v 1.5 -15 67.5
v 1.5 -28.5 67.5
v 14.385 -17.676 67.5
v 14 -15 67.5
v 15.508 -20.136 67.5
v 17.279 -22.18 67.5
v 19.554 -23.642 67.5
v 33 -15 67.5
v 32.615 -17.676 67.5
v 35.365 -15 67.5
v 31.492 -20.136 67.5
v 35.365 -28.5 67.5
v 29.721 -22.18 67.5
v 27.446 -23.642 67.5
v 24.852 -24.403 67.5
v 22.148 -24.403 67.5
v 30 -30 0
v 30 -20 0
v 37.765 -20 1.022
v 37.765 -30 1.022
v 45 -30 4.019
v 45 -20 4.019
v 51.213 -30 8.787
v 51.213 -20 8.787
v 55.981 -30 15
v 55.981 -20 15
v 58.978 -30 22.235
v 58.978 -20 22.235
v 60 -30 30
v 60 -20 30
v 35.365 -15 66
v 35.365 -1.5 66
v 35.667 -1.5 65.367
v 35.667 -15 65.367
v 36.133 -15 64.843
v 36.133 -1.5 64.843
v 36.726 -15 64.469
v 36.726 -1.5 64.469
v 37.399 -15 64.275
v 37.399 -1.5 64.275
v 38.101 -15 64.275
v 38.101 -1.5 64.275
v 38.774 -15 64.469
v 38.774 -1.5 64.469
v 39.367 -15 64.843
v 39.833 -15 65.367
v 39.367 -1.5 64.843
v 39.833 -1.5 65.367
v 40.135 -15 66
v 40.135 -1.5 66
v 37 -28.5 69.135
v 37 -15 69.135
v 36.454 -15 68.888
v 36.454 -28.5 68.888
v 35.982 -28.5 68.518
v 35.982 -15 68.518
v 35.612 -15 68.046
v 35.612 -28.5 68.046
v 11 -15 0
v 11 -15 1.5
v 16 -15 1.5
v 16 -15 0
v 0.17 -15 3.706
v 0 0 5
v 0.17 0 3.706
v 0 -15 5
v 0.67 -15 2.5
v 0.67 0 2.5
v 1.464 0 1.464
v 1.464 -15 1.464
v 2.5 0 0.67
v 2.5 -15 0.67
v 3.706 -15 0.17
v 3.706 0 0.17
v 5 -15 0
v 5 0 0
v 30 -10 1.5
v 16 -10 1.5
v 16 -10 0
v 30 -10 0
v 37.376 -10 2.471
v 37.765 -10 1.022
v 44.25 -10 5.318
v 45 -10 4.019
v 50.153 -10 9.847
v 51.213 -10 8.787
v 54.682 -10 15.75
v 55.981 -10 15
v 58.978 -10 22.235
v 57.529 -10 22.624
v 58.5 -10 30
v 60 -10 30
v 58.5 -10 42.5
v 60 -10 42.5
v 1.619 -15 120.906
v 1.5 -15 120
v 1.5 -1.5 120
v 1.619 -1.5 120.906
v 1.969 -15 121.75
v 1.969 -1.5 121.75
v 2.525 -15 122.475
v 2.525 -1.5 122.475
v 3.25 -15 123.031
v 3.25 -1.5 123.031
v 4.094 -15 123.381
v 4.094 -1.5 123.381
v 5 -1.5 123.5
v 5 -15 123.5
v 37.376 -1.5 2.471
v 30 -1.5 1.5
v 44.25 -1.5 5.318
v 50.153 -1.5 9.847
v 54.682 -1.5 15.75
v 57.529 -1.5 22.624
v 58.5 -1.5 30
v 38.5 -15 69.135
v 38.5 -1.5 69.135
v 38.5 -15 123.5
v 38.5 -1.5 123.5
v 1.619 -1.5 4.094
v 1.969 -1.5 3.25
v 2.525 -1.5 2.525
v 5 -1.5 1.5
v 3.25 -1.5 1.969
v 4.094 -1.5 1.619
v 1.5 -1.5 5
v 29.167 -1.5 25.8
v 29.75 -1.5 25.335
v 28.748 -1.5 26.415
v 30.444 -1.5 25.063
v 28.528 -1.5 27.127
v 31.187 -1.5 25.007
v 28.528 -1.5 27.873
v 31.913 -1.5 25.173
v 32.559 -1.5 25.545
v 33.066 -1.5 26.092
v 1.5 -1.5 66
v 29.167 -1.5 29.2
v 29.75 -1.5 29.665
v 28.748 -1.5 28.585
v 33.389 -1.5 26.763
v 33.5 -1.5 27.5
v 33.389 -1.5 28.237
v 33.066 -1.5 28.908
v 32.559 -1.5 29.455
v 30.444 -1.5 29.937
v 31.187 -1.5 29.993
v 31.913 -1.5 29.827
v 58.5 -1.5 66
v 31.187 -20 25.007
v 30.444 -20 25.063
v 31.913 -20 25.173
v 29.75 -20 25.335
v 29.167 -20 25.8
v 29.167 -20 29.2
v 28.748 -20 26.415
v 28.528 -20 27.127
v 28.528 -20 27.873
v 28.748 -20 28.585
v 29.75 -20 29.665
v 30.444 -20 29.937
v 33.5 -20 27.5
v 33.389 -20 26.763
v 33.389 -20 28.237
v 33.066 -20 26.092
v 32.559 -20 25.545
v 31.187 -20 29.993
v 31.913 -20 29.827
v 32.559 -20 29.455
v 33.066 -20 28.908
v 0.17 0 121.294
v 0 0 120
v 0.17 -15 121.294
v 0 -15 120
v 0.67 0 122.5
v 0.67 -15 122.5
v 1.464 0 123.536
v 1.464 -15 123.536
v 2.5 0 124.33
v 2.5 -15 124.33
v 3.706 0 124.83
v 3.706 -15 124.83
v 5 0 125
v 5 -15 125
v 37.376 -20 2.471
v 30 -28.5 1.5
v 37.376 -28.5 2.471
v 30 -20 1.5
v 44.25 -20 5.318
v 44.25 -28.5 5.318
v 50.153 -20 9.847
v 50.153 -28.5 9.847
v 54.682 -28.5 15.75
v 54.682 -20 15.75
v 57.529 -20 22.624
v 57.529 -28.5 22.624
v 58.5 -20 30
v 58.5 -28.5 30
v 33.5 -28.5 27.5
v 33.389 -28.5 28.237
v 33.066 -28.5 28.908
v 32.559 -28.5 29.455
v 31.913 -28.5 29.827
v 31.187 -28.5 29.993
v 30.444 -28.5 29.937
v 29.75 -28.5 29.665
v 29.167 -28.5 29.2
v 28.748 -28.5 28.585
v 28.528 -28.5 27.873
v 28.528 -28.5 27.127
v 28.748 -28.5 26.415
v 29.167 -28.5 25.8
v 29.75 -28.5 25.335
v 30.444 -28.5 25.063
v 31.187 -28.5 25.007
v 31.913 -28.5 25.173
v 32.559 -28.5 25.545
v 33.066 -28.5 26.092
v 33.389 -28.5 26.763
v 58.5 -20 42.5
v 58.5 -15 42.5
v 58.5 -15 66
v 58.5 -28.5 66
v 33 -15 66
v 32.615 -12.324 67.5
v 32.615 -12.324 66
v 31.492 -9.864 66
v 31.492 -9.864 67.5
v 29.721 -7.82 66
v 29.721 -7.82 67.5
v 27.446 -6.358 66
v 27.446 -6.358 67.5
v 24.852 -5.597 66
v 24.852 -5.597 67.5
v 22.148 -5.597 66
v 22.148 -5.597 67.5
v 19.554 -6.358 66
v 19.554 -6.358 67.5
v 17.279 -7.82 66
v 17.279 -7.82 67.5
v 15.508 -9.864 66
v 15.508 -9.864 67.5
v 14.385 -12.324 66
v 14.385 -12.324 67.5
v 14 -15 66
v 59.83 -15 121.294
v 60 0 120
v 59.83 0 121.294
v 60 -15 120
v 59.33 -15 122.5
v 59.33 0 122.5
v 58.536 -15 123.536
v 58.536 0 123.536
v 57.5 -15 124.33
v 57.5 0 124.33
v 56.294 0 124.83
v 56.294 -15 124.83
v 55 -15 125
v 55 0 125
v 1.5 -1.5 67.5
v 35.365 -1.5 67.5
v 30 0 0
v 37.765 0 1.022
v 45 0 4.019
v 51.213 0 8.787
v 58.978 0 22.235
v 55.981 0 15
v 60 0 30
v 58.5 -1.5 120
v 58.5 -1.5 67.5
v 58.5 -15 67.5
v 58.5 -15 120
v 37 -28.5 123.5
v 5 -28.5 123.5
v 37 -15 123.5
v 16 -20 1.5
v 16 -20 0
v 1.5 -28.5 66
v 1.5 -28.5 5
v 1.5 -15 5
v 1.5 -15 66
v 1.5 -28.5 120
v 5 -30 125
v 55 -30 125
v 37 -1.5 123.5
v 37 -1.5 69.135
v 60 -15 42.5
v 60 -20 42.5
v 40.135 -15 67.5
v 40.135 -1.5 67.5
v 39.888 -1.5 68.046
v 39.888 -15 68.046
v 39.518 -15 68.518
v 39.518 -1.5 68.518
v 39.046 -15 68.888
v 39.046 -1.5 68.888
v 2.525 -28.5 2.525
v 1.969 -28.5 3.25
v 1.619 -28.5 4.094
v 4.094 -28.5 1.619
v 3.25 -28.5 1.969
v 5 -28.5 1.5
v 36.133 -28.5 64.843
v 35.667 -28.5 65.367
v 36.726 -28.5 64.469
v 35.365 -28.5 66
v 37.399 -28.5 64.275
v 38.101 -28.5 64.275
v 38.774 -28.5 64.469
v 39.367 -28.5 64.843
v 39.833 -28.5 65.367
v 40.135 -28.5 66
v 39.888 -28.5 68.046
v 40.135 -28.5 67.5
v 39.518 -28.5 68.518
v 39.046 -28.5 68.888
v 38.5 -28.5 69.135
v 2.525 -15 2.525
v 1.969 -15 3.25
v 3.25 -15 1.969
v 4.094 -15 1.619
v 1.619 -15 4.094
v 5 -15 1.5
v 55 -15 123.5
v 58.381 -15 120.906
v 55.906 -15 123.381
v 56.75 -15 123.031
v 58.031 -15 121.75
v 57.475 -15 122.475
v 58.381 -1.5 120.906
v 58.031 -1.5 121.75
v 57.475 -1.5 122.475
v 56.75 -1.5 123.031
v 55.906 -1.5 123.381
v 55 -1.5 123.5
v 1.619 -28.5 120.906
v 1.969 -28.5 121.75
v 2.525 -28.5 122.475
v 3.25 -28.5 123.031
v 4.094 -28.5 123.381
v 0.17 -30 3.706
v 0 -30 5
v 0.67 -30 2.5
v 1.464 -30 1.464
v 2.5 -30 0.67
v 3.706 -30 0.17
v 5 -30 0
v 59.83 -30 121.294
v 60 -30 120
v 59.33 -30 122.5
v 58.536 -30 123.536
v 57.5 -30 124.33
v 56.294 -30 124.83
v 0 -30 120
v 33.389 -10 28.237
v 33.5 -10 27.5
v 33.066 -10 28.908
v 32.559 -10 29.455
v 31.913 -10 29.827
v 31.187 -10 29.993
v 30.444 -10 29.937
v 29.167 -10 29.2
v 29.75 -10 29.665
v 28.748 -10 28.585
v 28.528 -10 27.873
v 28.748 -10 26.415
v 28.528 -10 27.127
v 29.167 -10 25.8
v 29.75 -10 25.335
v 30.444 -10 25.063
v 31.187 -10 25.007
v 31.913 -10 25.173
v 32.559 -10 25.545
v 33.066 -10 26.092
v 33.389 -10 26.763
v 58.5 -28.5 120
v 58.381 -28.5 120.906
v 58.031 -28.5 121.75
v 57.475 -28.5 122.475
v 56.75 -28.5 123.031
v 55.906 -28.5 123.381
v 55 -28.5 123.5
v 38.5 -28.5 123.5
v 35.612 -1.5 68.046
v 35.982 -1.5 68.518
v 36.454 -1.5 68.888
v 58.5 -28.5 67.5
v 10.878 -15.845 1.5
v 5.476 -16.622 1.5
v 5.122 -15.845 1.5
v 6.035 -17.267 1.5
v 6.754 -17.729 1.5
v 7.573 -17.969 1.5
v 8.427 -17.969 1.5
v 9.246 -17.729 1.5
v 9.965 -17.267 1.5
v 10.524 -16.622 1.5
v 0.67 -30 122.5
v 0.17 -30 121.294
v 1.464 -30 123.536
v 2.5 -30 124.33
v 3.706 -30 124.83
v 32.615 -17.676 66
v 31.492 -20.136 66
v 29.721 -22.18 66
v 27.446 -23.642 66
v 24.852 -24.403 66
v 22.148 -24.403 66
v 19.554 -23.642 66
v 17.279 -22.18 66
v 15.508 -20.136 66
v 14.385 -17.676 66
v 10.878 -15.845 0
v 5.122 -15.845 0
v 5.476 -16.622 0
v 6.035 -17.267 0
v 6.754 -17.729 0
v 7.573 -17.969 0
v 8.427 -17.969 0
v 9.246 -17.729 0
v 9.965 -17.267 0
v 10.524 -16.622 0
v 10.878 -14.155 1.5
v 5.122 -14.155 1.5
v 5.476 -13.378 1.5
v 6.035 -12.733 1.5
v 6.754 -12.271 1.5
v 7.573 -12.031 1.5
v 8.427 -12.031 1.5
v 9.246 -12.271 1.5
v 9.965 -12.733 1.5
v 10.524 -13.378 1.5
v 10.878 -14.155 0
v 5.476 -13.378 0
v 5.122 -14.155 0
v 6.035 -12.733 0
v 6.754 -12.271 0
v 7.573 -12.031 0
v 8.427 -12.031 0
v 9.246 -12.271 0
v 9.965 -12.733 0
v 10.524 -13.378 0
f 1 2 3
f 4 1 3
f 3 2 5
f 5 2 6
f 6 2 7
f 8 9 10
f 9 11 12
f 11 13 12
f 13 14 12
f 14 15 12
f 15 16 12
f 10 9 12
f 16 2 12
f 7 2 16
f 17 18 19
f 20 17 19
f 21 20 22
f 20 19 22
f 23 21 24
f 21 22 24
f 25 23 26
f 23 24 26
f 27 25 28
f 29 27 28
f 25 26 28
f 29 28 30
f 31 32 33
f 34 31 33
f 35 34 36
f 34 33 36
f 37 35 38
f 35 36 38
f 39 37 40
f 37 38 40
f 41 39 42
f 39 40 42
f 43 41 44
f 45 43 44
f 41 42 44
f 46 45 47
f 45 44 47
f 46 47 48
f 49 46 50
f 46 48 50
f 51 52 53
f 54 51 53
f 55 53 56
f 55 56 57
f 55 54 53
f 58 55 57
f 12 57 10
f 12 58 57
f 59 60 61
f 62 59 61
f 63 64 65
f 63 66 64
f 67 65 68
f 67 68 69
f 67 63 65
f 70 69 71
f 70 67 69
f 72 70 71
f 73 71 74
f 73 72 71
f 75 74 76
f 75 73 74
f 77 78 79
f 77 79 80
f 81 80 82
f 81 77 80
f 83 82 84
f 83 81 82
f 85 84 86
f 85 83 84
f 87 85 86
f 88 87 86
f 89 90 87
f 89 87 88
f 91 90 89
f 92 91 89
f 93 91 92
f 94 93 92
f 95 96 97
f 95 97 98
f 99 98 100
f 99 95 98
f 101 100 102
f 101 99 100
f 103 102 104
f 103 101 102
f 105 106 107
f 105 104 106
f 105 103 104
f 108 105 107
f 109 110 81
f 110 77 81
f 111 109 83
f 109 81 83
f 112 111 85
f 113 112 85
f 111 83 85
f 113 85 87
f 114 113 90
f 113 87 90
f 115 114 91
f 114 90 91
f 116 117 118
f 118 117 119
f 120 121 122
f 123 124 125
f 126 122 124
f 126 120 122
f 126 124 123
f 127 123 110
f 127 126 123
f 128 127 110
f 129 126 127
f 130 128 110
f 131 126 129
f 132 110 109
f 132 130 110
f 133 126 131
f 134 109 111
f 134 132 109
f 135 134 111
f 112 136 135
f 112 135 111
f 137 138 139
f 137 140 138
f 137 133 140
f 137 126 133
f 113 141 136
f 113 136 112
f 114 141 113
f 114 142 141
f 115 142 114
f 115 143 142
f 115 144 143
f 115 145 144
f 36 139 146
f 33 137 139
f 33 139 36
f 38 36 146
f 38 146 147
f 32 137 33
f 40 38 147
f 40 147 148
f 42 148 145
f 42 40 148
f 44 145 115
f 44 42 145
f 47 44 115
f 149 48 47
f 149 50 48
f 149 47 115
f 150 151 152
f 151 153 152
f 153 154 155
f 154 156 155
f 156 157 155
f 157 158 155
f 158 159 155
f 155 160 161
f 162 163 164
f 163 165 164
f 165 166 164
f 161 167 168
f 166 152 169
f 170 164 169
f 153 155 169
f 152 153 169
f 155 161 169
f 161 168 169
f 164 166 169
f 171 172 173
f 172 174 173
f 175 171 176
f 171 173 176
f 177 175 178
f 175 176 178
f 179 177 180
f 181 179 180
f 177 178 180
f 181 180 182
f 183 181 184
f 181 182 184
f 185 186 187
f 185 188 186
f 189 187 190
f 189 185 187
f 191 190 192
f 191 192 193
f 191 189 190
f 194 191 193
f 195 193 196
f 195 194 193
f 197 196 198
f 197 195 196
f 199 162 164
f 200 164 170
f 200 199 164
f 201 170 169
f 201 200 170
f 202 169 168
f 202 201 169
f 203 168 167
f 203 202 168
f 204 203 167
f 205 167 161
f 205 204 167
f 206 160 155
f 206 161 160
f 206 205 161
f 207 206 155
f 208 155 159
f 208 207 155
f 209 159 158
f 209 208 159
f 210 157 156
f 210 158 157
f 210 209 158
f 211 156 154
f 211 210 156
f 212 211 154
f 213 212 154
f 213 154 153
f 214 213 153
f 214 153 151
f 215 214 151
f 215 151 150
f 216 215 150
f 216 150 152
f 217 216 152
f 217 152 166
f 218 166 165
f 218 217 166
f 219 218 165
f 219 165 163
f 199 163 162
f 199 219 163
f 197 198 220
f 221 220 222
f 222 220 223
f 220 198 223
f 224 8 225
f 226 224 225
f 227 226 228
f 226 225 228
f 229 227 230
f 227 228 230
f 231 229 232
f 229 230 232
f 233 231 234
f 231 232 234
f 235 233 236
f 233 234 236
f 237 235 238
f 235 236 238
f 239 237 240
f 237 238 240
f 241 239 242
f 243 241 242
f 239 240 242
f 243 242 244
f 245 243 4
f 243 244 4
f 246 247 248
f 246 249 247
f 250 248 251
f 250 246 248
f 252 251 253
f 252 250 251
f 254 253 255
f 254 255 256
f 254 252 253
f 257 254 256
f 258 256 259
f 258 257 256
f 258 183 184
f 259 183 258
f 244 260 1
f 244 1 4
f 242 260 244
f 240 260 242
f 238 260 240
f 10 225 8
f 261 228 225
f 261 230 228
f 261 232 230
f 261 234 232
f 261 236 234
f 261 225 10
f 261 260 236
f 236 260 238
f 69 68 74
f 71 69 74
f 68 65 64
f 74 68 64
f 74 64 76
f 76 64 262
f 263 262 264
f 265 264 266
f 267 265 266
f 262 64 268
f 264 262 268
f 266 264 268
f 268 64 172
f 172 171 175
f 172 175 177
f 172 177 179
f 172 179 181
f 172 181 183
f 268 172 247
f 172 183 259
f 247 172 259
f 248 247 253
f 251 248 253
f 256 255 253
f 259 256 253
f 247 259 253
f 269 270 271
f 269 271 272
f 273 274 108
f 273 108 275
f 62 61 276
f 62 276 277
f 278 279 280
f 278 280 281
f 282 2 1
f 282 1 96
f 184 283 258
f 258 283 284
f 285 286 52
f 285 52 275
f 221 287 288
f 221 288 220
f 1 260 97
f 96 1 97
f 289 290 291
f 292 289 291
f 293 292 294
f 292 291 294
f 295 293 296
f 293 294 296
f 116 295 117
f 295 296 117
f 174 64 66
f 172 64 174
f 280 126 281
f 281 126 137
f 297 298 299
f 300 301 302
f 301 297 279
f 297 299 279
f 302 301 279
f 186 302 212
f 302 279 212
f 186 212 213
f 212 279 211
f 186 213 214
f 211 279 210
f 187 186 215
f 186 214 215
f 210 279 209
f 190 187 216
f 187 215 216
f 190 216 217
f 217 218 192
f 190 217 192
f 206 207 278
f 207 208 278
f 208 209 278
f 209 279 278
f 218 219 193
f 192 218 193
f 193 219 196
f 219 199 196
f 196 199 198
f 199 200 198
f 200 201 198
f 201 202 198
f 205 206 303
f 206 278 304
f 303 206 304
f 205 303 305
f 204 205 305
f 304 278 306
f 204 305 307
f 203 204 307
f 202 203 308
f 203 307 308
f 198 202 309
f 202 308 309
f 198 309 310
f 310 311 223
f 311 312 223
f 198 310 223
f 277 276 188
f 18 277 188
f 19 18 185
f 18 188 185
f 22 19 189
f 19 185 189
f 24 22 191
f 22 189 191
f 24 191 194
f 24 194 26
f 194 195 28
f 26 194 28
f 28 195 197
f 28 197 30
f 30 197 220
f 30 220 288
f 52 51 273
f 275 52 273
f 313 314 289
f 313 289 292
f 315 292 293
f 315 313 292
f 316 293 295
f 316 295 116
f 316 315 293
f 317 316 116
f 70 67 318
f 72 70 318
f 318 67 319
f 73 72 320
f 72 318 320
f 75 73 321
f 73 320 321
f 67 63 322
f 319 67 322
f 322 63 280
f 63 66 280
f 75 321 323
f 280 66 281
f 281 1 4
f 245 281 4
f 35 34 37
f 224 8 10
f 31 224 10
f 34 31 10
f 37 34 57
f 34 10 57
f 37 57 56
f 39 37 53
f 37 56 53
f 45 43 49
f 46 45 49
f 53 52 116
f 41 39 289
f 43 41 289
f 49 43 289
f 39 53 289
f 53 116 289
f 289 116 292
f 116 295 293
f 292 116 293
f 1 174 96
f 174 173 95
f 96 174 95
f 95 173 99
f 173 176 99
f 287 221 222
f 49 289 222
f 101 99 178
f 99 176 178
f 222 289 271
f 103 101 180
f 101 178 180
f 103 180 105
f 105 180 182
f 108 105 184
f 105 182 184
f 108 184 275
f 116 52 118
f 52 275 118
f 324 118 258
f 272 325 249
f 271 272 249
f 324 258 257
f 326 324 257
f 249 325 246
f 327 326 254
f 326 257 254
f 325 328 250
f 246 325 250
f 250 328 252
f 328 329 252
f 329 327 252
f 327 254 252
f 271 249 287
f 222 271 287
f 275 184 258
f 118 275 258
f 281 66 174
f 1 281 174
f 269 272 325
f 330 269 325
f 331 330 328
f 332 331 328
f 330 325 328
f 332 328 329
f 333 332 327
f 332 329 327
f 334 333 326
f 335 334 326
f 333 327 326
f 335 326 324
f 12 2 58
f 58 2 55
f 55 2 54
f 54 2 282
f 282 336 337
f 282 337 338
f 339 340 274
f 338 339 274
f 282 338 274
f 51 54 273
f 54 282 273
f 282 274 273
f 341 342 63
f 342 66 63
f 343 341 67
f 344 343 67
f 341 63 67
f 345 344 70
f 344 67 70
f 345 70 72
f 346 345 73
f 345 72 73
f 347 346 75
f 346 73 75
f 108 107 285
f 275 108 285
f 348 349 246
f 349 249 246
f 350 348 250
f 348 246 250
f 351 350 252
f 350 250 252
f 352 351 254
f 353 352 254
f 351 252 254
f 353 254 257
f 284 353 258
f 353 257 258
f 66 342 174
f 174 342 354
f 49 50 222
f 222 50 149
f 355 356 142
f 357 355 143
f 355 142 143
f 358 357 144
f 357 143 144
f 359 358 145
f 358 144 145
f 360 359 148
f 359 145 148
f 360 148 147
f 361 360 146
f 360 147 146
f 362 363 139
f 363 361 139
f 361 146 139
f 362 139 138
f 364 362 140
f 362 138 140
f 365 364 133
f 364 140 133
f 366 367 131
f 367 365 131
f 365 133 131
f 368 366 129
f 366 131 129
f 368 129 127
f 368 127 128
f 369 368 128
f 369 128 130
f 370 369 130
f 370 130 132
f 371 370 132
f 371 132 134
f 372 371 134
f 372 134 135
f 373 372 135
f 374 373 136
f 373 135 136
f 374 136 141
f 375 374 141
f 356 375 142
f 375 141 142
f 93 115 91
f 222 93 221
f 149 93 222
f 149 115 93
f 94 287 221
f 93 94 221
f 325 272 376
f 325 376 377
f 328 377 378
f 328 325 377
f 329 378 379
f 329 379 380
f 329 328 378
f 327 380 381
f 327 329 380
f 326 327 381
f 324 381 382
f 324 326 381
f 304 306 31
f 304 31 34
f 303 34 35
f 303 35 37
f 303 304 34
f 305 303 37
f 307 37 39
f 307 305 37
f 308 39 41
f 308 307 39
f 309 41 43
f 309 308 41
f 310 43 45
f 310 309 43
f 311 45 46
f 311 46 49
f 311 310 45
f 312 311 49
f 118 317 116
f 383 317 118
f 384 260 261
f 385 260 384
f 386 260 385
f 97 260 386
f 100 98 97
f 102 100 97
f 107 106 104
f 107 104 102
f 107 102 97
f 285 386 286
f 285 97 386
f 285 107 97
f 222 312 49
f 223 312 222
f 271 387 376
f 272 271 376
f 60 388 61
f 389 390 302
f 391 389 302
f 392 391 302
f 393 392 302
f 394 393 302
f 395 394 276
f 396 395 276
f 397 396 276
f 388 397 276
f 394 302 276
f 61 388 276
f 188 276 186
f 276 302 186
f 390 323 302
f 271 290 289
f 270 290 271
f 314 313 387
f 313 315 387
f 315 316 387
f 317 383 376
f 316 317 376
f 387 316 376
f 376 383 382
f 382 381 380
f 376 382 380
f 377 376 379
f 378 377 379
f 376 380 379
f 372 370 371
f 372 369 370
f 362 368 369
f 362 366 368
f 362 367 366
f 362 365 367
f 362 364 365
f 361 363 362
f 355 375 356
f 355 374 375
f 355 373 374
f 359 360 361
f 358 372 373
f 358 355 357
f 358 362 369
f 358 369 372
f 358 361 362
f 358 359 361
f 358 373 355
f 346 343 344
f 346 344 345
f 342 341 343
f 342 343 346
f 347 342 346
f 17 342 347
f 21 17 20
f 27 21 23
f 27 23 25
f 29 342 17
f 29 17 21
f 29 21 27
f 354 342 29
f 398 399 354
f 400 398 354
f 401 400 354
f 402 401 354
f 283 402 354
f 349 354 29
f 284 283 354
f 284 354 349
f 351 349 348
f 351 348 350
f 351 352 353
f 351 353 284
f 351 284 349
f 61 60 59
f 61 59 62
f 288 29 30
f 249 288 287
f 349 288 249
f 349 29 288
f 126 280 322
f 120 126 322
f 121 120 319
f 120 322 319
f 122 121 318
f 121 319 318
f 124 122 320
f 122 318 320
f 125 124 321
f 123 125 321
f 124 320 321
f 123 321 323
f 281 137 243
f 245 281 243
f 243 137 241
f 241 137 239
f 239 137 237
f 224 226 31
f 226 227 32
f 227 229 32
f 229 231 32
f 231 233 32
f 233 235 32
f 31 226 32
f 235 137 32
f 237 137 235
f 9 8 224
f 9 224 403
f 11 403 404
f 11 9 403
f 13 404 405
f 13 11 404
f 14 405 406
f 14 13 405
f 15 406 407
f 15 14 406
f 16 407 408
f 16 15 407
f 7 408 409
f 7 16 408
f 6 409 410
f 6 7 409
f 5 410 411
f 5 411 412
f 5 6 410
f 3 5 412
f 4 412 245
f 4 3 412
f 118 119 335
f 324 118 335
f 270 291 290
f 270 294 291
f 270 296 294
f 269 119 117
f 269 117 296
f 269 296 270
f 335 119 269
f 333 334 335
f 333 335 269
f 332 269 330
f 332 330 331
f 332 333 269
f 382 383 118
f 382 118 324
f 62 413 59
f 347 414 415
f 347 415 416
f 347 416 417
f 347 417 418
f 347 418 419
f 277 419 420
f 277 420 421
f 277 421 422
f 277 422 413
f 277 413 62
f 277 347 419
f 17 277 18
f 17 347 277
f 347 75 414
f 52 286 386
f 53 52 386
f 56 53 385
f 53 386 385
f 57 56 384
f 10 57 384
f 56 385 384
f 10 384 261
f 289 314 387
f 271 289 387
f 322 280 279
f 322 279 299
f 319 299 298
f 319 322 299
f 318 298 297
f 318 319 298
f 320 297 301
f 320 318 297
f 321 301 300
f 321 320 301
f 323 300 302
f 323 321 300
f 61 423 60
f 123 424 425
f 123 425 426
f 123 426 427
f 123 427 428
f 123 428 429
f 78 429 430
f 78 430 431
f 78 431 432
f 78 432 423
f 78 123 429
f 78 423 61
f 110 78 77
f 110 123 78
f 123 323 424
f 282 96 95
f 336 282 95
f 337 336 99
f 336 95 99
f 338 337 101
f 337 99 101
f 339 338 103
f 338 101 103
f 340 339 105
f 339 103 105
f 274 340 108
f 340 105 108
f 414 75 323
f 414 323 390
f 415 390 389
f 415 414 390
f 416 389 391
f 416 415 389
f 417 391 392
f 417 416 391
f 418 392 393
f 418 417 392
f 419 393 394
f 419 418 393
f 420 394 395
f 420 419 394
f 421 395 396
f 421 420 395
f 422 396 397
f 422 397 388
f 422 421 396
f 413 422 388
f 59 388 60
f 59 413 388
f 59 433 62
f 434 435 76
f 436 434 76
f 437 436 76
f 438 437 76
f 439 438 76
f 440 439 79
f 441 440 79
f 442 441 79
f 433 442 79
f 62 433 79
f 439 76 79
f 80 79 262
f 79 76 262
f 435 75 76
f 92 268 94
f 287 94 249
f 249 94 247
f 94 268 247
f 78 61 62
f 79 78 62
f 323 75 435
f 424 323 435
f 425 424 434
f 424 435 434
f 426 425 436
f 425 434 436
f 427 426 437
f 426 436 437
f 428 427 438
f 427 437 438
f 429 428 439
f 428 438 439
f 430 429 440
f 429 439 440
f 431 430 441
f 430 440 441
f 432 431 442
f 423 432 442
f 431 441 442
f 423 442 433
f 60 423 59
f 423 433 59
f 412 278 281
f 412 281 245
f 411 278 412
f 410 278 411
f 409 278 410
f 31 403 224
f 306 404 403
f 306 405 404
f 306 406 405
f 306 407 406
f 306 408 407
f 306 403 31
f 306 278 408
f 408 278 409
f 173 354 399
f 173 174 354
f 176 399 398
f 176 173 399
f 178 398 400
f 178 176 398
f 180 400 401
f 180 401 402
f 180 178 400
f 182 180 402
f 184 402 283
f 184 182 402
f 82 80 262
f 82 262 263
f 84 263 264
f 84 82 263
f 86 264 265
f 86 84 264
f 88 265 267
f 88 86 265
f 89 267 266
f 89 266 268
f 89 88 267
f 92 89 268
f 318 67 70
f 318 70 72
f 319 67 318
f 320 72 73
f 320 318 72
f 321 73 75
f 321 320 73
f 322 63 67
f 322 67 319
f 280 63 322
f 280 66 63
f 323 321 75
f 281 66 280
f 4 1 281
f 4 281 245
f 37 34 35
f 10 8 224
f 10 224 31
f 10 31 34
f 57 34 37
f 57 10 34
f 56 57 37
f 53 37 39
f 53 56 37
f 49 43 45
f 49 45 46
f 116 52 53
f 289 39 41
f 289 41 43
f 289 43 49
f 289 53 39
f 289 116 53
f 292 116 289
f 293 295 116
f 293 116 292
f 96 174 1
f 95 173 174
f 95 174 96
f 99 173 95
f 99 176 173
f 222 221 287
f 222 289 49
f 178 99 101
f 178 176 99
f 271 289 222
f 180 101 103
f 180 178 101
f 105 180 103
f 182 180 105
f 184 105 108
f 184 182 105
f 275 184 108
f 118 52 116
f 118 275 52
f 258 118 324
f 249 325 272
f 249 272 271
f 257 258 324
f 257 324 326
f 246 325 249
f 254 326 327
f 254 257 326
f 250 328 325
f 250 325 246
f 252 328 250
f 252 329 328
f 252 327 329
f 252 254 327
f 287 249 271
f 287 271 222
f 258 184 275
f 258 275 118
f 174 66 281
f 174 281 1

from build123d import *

# Parameters (mm, degrees)
F0_W      = 60
F0_H      = 125
F1_DEPTH  = 15
F2_R      = 5
F3_R      = 30
F4_T      = -1.5
F5_W      = 57
F5_H      = 1.5
F6_DEPTH  = 13.5
F7_R      = 9.5
F8_DEPTH  = 1.5
F9_W      = 1.5
F9_H      = 56
F10_DEPTH = 13.5
F11_R     = 2.5
F12_DEPTH = 13.5
F14_DEPTH = 1.5
F15_R     = 2.5
F16_DEPTH = 13.5
F18_DEPTH = 5


# Not quite as in the source:
# - a feature of the source that left no trace in its solid (it failed there, or was rolled back) is left out


with BuildPart() as f1:
    # F0 (on Front) → F1 (new body)
    with BuildSketch(Plane.XZ):
        with Locations((30, 62.5)):
            Rectangle(F0_W, F0_H)
    extrude(amount=F1_DEPTH)

    # F2
    f2_edges = [f1.edges().sort_by_distance(p)[0] for p in [
        (0, -7.5, 125),
        (60, -7.5, 125),
        (0, -7.5, 0),
    ]]
    fillet(f2_edges, radius=F2_R)

    # F3
    f3_edges = [f1.edges().sort_by_distance(p)[0] for p in [
        (60, -7.5, 0),
    ]]
    fillet(f3_edges, radius=F3_R)

    # F4
    f4_openings = [f1.faces().sort_by_distance(p)[0] for p in [
        (29.404035, -15, 63.933016),
    ]]
    offset(amount=F4_T, openings=f4_openings)

    # F5 (on face) → F6 (join, through all)
    with BuildSketch(Plane.XZ.offset(1.5)):
        with Locations((30, 66.75)):
            Rectangle(F5_W, F5_H)
    extrude(amount=F6_DEPTH)

    # F7 (on face) → F8 (cut, through all)
    with BuildSketch(Plane.XY.offset(67.5)):
        with Locations((23.5, -15)):
            Circle(F7_R)
    extrude(amount=-F8_DEPTH, mode=Mode.SUBTRACT)

    # F9 (on face) → F10 (join, through all)
    with BuildSketch(Plane.XZ.offset(1.5)):
        with Locations((37.75, 95.5)):
            Rectangle(F9_W, F9_H)
    extrude(amount=F10_DEPTH)

    # F11 (on face) → F12 (join, through all)
    with BuildSketch(Plane.XZ.offset(1.5)):
        with Locations((37.75, 66.75)):
            Circle(F11_R)
    extrude(amount=F12_DEPTH)

    # F13 (on face) → F14 (cut, through all)
    with BuildSketch(Plane(origin=(0, 0, 0), x_dir=(1, 0, 0), z_dir=(0, 0, -1))):
        with BuildLine():
            ThreePointArc((5, 15), (8, 12), (11, 15))
            Line((11, 15), (5, 15))
        make_face()
    extrude(amount=-F14_DEPTH, mode=Mode.SUBTRACT)

    # F15 (on face) → F16 (join, through all)
    with BuildSketch(Plane.XZ.offset(1.5)):
        with Locations((31, 27.5)):
            Circle(F15_R)
    extrude(amount=F16_DEPTH)

    # F17 (on face) → F18 (cut)
    with BuildSketch(Plane.XZ.offset(15)):
        with BuildLine():
            Line((60, 42.5), (31, 42.5))
            ThreePointArc((31, 42.5), (20.3933982822, 38.1066017178), (16, 27.5))
            Line((16, 27.5), (16, 0))
            Line((16, 0), (60, 0))
            Line((60, 0), (60, 42.5))
        make_face()
    extrude(amount=-F18_DEPTH, mode=Mode.SUBTRACT)


with BuildPart() as f19_1:
    # F19: instance of F1
    add(f1.part.mirror(Plane(origin=(28.1417704528, -15, 81.7211292347), x_dir=(1, 0, 0), z_dir=(0, -1, 0))))


solid = Compound([f1.part, f19_1.part])
